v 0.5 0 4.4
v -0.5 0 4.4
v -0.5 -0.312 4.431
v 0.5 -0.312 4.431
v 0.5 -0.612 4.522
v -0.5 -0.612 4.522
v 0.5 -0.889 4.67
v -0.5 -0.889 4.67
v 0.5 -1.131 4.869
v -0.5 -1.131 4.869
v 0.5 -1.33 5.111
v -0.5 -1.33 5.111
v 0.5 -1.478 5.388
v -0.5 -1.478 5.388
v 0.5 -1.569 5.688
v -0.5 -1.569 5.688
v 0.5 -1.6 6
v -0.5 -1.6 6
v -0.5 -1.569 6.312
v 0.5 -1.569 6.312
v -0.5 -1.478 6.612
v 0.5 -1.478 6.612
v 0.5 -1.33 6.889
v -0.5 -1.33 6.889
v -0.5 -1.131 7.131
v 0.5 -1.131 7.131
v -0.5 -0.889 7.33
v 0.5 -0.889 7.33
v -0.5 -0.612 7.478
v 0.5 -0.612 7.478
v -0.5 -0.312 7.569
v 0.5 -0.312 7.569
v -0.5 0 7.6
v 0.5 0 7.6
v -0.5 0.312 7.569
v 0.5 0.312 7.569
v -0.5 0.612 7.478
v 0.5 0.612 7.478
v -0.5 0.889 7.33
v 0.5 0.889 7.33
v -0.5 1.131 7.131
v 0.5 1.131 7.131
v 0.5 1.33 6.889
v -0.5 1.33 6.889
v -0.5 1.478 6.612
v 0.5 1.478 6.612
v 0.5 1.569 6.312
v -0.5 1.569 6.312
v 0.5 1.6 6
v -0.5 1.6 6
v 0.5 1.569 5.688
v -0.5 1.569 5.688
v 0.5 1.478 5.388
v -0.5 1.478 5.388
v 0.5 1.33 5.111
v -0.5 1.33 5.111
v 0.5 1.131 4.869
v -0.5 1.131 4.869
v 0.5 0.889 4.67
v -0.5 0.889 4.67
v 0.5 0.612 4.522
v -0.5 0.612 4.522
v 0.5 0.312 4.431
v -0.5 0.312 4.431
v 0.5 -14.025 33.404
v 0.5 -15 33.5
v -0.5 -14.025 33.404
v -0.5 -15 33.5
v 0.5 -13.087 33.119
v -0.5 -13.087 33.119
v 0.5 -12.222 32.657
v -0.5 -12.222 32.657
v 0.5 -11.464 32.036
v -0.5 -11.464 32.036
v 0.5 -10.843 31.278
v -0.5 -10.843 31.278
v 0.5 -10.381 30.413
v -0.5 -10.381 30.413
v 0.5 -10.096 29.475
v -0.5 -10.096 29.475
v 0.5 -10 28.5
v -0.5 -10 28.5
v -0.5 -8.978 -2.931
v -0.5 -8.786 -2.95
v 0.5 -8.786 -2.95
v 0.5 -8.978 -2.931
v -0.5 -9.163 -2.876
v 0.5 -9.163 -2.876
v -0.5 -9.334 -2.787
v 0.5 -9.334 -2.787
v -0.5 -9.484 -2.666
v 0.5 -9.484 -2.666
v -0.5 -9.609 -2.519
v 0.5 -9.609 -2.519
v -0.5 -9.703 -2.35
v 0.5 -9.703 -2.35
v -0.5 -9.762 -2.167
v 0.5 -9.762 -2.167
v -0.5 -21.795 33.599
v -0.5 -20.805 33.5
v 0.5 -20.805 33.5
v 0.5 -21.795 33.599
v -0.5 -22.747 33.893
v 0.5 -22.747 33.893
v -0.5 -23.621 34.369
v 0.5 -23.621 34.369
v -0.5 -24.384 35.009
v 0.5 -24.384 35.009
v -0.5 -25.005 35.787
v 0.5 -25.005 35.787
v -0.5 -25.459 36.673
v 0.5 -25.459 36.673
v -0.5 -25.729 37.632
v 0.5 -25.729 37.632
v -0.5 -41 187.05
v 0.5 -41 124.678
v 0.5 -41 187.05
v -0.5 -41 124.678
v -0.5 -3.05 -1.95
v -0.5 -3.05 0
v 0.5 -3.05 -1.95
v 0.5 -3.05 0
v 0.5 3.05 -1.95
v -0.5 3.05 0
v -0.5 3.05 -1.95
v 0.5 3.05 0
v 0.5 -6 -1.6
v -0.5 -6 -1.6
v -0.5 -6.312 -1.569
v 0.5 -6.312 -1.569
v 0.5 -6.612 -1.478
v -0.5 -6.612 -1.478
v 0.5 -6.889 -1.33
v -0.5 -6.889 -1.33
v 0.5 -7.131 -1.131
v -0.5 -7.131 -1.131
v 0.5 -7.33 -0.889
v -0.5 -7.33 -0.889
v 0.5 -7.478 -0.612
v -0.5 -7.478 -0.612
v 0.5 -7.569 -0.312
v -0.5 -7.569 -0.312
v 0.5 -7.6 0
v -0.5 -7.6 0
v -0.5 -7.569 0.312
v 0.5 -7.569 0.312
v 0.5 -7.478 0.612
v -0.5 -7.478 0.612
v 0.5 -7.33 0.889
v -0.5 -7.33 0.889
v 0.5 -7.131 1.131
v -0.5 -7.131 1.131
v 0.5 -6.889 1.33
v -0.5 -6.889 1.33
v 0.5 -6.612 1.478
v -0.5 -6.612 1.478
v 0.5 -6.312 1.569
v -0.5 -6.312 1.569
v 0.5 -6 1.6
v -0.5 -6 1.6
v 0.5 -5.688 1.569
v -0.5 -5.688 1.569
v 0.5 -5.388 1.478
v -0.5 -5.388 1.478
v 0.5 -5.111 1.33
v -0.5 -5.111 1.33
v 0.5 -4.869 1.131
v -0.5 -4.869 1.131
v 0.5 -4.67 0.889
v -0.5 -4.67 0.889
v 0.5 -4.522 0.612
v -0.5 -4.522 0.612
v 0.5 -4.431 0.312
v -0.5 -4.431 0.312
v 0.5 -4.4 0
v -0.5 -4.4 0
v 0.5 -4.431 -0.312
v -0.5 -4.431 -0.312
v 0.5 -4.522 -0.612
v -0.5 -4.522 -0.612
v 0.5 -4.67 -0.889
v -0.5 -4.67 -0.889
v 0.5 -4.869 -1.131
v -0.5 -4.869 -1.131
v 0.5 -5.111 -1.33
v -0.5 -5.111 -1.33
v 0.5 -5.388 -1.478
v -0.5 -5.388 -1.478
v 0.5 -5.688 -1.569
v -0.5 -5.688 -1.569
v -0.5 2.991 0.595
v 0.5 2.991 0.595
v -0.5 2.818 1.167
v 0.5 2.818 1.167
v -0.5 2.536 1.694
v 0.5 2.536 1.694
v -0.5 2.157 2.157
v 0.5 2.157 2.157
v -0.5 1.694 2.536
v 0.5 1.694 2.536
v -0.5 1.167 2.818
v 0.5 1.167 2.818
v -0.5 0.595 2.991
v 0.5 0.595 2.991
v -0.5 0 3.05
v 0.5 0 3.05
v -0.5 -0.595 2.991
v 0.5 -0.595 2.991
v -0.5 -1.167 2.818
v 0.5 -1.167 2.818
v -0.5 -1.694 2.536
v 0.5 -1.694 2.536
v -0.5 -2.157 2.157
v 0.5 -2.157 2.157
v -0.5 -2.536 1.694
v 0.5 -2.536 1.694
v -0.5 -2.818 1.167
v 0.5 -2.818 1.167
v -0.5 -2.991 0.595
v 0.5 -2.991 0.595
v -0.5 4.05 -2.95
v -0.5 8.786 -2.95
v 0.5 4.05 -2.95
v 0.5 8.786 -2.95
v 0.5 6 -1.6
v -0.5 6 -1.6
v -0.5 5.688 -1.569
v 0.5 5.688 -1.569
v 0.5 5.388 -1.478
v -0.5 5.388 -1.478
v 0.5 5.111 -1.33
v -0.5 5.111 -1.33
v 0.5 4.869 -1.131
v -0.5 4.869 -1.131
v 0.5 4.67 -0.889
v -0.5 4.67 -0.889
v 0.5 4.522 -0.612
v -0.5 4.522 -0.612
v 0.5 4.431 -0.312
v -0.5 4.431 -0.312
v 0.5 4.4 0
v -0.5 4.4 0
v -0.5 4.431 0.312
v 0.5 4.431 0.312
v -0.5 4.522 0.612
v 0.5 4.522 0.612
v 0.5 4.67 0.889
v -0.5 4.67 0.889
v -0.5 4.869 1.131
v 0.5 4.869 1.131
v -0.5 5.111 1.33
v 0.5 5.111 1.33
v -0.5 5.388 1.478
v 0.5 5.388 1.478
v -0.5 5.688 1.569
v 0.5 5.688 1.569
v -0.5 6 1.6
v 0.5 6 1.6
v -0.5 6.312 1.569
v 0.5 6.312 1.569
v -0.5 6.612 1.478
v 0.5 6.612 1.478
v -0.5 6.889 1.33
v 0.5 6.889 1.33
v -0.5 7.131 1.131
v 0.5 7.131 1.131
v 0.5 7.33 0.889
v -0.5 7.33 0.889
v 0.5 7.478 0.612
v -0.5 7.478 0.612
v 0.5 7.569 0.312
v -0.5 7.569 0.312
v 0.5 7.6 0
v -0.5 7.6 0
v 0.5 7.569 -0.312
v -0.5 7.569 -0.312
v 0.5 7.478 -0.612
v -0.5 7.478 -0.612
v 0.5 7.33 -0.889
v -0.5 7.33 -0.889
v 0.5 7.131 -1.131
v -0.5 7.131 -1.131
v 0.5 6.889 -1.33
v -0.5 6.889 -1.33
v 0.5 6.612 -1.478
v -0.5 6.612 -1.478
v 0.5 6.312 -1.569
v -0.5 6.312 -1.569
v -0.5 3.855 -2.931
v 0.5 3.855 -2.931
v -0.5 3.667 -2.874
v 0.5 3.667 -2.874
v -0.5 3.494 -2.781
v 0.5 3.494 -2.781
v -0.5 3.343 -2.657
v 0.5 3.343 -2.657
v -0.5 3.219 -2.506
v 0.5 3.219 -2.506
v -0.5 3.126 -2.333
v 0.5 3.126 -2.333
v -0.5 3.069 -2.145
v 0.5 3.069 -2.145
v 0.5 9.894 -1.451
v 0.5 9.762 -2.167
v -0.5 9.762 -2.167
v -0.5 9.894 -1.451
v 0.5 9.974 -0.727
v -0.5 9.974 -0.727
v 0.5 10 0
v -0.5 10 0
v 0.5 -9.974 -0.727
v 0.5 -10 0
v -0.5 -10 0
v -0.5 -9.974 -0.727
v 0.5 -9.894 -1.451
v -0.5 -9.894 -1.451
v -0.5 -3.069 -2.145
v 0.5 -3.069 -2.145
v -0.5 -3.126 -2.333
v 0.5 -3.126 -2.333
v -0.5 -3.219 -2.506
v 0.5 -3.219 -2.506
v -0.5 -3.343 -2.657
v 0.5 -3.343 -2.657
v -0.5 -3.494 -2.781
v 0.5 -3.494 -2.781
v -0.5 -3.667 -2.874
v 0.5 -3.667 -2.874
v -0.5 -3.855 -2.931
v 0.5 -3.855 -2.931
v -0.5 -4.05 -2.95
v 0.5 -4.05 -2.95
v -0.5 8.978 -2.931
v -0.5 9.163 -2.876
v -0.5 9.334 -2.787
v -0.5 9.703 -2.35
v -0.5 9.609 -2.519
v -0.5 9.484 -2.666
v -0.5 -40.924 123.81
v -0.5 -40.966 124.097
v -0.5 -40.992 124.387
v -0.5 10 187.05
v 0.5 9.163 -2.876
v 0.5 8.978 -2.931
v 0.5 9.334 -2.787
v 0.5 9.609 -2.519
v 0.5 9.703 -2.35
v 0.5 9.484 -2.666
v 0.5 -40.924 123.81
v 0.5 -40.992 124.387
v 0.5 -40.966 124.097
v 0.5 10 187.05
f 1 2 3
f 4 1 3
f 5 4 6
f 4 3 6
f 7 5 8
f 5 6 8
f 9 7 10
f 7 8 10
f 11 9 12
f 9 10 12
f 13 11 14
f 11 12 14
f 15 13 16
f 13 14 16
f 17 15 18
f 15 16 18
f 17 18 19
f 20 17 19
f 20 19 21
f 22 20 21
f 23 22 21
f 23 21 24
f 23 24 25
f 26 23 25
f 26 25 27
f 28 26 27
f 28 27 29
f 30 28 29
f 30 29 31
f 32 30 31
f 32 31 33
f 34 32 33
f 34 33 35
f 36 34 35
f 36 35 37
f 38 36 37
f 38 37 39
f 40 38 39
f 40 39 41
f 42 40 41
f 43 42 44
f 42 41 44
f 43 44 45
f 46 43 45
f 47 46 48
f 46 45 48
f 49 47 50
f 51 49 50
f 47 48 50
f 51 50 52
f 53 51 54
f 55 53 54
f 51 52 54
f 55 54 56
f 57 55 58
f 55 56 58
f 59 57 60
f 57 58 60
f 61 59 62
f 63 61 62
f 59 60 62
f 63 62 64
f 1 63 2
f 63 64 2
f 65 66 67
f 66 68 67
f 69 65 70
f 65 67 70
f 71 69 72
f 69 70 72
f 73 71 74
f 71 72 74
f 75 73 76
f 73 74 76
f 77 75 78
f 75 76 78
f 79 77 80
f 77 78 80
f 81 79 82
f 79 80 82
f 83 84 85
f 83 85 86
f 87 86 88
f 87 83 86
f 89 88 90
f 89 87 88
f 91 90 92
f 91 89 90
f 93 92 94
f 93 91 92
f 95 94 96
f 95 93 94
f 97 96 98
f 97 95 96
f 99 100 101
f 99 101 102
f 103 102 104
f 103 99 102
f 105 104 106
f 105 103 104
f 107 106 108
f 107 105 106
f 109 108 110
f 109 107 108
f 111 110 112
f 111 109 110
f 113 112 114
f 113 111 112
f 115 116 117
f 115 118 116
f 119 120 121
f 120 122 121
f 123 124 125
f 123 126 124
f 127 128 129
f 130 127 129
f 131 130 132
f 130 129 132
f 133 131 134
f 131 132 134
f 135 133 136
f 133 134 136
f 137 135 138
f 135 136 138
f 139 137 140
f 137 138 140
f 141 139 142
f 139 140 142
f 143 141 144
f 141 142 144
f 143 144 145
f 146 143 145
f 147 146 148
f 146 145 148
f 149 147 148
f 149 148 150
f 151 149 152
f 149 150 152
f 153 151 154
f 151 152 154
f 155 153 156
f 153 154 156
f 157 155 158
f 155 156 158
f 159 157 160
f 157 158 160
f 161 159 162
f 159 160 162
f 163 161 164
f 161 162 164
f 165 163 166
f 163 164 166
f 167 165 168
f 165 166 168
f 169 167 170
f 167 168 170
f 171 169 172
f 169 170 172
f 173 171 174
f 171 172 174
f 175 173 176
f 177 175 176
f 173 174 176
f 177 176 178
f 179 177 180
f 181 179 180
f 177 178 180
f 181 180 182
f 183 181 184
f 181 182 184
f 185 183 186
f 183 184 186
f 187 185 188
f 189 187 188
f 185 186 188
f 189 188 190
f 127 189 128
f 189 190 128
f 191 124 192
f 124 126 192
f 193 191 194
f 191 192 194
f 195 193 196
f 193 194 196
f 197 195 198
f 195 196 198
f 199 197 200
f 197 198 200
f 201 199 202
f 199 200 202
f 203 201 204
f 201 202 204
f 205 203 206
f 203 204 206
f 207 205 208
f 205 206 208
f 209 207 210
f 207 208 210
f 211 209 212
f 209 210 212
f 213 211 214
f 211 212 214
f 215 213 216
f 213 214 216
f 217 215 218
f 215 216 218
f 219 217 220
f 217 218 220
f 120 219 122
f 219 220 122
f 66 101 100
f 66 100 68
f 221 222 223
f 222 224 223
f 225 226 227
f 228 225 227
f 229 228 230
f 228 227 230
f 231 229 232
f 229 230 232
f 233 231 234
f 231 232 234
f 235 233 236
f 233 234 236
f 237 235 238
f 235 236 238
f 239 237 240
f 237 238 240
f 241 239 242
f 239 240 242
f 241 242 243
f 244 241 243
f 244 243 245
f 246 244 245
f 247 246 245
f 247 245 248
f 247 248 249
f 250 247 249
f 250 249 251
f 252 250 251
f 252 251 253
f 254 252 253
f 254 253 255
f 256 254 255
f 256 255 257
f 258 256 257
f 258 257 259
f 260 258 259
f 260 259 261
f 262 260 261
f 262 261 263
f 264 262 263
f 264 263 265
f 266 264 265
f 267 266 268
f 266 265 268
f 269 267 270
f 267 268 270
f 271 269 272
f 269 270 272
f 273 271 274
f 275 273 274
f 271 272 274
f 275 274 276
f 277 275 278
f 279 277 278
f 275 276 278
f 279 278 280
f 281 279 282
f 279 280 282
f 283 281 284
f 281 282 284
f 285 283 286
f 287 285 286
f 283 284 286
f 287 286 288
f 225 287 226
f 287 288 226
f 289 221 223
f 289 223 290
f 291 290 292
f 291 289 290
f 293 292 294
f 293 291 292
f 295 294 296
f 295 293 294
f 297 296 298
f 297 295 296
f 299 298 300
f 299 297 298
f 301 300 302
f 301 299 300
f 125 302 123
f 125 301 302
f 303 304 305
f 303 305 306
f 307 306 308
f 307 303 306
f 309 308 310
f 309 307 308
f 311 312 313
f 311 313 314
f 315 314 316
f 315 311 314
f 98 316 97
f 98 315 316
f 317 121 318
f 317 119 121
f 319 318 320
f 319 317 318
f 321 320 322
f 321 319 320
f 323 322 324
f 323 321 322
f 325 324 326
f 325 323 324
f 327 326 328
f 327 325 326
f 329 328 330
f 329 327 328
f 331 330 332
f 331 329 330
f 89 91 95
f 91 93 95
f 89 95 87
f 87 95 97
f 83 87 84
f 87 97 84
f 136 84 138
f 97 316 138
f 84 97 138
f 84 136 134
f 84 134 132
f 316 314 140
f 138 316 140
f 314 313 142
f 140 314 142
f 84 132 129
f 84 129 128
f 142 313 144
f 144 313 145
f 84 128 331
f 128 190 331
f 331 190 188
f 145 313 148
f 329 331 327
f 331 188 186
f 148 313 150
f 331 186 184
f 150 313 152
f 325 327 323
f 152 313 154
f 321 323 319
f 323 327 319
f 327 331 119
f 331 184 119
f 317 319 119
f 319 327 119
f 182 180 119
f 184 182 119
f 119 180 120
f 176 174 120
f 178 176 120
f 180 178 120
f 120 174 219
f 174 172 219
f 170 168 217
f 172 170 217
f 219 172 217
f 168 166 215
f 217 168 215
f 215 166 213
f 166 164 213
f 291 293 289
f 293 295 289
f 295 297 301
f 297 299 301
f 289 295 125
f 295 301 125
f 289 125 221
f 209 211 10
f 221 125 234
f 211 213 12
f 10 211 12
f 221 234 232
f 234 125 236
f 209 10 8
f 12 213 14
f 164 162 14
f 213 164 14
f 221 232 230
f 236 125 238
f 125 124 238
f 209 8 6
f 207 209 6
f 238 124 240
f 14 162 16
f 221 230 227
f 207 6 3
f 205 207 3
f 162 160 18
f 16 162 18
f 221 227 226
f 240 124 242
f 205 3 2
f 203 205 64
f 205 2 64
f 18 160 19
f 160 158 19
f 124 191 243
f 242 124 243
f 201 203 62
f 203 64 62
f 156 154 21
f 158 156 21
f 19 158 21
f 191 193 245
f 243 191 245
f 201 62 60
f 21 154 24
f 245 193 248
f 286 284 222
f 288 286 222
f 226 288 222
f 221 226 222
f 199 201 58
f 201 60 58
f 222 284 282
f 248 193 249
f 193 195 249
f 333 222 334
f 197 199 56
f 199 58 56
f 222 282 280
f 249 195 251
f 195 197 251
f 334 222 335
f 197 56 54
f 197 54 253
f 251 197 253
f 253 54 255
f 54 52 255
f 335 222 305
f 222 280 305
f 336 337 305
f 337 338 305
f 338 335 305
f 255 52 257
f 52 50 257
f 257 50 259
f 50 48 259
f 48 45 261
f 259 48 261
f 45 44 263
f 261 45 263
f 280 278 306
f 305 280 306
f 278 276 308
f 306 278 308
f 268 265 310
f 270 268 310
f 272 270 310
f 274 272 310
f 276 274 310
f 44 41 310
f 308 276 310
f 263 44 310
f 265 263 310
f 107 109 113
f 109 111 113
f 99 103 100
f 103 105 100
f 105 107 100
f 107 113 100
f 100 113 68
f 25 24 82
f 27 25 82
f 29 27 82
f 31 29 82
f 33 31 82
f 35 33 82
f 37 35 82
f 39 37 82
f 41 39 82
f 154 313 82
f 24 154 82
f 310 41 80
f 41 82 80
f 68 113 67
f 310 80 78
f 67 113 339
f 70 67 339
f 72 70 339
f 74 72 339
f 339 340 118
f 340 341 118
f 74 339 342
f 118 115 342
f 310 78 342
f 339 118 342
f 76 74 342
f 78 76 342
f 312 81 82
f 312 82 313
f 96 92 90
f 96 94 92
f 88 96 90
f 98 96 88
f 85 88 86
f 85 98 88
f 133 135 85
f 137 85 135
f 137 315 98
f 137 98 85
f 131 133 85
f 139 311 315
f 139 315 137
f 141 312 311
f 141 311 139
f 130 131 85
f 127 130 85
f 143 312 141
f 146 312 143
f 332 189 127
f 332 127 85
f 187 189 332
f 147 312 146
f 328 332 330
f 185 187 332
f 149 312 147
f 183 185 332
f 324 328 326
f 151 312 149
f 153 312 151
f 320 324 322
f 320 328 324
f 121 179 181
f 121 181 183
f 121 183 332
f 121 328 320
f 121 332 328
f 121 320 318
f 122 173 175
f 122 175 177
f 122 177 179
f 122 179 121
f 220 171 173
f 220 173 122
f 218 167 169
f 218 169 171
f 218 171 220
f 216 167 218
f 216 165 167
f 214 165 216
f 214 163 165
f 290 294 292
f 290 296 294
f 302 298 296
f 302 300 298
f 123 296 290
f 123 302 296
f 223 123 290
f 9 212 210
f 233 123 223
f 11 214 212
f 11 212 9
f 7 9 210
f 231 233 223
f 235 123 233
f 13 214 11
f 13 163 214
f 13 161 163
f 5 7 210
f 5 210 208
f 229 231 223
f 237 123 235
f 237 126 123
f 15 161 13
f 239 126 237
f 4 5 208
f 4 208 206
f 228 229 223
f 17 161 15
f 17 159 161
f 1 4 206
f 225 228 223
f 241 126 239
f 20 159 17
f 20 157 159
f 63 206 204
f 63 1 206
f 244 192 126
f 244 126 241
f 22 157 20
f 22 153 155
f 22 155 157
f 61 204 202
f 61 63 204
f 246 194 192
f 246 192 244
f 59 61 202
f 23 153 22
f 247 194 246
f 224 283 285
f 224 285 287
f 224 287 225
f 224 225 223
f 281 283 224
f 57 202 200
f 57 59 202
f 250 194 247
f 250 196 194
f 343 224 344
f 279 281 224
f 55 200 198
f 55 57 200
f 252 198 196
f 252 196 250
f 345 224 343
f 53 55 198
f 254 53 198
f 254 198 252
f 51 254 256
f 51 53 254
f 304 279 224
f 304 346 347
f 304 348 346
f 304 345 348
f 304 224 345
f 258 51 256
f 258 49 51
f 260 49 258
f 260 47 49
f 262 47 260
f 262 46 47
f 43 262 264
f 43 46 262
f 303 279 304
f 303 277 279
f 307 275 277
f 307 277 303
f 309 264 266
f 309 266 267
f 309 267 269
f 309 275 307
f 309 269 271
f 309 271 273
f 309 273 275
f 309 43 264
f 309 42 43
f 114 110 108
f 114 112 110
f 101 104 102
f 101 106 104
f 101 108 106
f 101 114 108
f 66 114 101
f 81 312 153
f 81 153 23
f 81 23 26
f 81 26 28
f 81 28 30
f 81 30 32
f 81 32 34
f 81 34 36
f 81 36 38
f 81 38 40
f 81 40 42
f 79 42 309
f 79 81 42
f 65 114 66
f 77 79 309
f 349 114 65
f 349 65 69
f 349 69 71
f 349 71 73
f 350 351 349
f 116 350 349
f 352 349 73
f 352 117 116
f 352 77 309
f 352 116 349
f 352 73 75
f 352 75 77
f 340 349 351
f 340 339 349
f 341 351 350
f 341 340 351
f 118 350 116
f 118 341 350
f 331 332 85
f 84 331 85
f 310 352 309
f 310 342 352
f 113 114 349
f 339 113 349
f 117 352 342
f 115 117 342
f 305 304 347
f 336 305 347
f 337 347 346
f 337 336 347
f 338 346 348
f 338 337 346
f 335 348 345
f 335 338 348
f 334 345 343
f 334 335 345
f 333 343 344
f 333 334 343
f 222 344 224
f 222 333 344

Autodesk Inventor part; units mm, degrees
ref_plane "YZ Plane" through (0, 0, 0) normal (1, 0, 0) x (0, 1, 0)
ref_plane "XZ Plane" through (0, 0, 0) normal (0, 1, 0) x (-1, 0, 0)
ref_plane "XY Plane" through (0, 0, 0) normal (0, 0, 1) x (1, 0, 0)
sketch "スケッチ1" plane through (0, 0, 0) normal (1, 0, 0) x (0, 1, 0)
  line L0 (-41, 550) -> (10, 550)
  line L1 (10, 550) -> (10, -10)
  line L2 (10, -10) -> (-41, -10)
  line L3 (-41, -10) -> (-41, 550)
  line L4 (-41, 550) -> (10, -10) construction
  line L5 (10, 550) -> (-41, -10) construction
  point P0 (0, 0)
  dimension "d0" = 51
  dimension "d1" = 560
  dimension "d42" = 10
  dimension "d43" = 10
extrude "プレート1" add sketch "スケッチ1" along normal mid plane 1
sketch "スケッチ3" plane through (0.5, 0, 0) normal (1, 0, 0) x (0, 0, -1)
  circle A0 centre (0, 0) radius 6
  line L0 (10, 10) -> (10, -41) projected
  line L1 (-550, 10) -> (10, 10) projected
  point P0 (0, 0)
  point P1 (0, 6)
  point P2 (-6, 0)
  point P3 (0, -6)
  point P4 (6, 0)
  dimension "d13" = 12
  dimension "d14" = 10
  dimension "d15" = 10
  dimension "d18" = 360
  dimension "d44" = 0
hole "穴2" at (0.5, 6, 0) at (0.5, 0, 6) at (0.5, -6, 0) at (0.5, 0, -6) direction (-1, 0, 0) diameter 3.2 end through all clearance for "Socket Head Cap Screw" size "M3" standard "Ansi Metric M Profile"
sketch "スケッチ4" plane through (0.5, 0, 0) normal (1, 0, 0) x (0, 0, -1)
  circle A0 centre (0, 0) radius 3.05
  point P0 (0, 0)
  dimension "d27" = 6.1
extrude "押し出し1" cut sketch "スケッチ4" against normal blind 10
sketch "スケッチ5" plane through (0.5, 0, 0) normal (1, 0, 0) x (0, 0, -1)
  line L0 (10, -41) -> (-33.5, -41)
  line L1 (-33.5, -41) -> (-33.5, -10)
  line L2 (-33.5, -10) -> (10, -10)
  line L3 (10, -10) -> (10, -41)
  line L4 (-550, 10) -> (-53.5, 10)
  line L5 (-53.5, 10) -> (-53.5, -12)
  line L6 (-53.5, -12) -> (-550, -12)
  line L7 (-550, -12) -> (-550, 10)
  line L8 (10, -41) -> (-550, -41) projected
  circle A0 centre (0, 0) radius 3.05 projected
  circle A1 centre (0, 0) radius 3.05 projected
  line L9 (0, 3.05) -> (10, 3.05)
  line L10 (0, -3.05) -> (10, -3.05)
  line L11 (10, 10) -> (10, -41) projected
  circle A2 centre (0, 0) radius 10
  circle A3 centre (0, 6) radius 1.6 projected
  circle A4 centre (0, -6) radius 1.6 projected
  line L12 (-550, 10) -> (10, 10) projected
  line L13 (2.95, 10) -> (2.95, -10)
  point P0 (0, 0)
  point P1 (2.95, -3.05)
  point P2 (2.95, 3.05)
  point P3 (2.95, 0.7746)
  point P4 (2.95, -0.7746)
  point P5 (9.5235, -3.05)
  point P6 (0, -10)
  point P7 (0, 10)
  point P8 (9.5235, 3.05)
  point P9 (10, 0)
  point P10 (2.95, -9.555)
  point P11 (2.95, 9.555)
  dimension "d35" = 29
  dimension "d36" = 20
  dimension "d40" = 33.5
  dimension "d41" = 10
  dimension "d45" = 2.95
extrude "押し出し2" cut sketch "スケッチ5" against normal blind 10 contours L0 L1 L2 L3 | L2 L13 A2 L10 L11 | L2 A2 L13 | L10 A2 L11 | L13 L10 A2 | L10 L13 A0 L9 A2 | A2 L9 L11 | L12 L13 A2 | L10 A0 L13 | L9 A2 L13 L12 L11 | L9 L13 A2 | L13 A0 L9 picked at (5.1412, -2.2915)
fillet "コーナーR4" radius 1 4 edges at (0, -3.05, -2.95) (0, 3.05, -2.95) (0, 9.555, -2.95) (0, -9.555, -2.95)
sketch "スケッチ6" plane through (0.5, 0, 0) normal (1, 0, 0) x (0, 0, -1)
  line L0 (-33.5, -41) -> (-550, -41) projected
  line L1 (-33.5, -41) -> (-33.5, -10) projected
  line L2 (-33.5, -25) -> (-124.2405, -41)
  point P0 (0, 0)
  point P1 (-545, -41)
  point P2 (-33.5, -15)
  dimension "d51" = 10
  dimension "d52" = 16
extrude "押し出し3" cut sketch "スケッチ6" against normal blind 10
fillet "コーナーR5" radius 5 2 edges at (0, -25, 33.5) (0, -41, 124.2405)
fillet "コーナーR6" radius 5 2 edges at (0, -10, 33.5) (0, 10, 550)
ref_plane "作業平面1" through (0.5, 4.05, 187.05) normal (0, 0, -1) x (-1, 0, 0)
sketch "スケッチ7" plane through (0.5, 4.05, 187.05) normal (0, 0, -1) x (-1, 0, 0)
  line L0 (1, -45.05) -> (0, -45.05) projected
  line L1 (0, -45.05) -> (1, -45.05)
  line L2 (1, -45.05) -> (1, 5.95)
  line L3 (1, 5.95) -> (0, 5.95)
  line L4 (0, 5.95) -> (0, -45.05)
  point P0 (0.5, -4.05)
  point P1 (1, -45.05)
extrude "押し出し4" cut sketch "スケッチ7" against normal through all
equation "\"d15\" = d14"
equation "\"d25\" = Thickness"
equation "\"d2\" = Thickness"
equation "\"d43\" = d42"
equation "\"BendRadius\" = Thickness"
equation "\"BendReliefWidth\" = Thickness"
equation "\"BendReliefDepth\" = 0.5 * Thickness"
equation "\"CornerReliefSize\" = 4 * Thickness"
equation "\"MinimumRemnant\" = 2 * Thickness"
equation "\"TransitionRadius\" = BendRadius"
equation "\"JacobiRadiusSize\" = BendRadius"
equation "\"GapSize\" = Thickness"
equation "\"Thickness\" = 1"
properties part number "s_carbon_plate5" material "CFRP"
